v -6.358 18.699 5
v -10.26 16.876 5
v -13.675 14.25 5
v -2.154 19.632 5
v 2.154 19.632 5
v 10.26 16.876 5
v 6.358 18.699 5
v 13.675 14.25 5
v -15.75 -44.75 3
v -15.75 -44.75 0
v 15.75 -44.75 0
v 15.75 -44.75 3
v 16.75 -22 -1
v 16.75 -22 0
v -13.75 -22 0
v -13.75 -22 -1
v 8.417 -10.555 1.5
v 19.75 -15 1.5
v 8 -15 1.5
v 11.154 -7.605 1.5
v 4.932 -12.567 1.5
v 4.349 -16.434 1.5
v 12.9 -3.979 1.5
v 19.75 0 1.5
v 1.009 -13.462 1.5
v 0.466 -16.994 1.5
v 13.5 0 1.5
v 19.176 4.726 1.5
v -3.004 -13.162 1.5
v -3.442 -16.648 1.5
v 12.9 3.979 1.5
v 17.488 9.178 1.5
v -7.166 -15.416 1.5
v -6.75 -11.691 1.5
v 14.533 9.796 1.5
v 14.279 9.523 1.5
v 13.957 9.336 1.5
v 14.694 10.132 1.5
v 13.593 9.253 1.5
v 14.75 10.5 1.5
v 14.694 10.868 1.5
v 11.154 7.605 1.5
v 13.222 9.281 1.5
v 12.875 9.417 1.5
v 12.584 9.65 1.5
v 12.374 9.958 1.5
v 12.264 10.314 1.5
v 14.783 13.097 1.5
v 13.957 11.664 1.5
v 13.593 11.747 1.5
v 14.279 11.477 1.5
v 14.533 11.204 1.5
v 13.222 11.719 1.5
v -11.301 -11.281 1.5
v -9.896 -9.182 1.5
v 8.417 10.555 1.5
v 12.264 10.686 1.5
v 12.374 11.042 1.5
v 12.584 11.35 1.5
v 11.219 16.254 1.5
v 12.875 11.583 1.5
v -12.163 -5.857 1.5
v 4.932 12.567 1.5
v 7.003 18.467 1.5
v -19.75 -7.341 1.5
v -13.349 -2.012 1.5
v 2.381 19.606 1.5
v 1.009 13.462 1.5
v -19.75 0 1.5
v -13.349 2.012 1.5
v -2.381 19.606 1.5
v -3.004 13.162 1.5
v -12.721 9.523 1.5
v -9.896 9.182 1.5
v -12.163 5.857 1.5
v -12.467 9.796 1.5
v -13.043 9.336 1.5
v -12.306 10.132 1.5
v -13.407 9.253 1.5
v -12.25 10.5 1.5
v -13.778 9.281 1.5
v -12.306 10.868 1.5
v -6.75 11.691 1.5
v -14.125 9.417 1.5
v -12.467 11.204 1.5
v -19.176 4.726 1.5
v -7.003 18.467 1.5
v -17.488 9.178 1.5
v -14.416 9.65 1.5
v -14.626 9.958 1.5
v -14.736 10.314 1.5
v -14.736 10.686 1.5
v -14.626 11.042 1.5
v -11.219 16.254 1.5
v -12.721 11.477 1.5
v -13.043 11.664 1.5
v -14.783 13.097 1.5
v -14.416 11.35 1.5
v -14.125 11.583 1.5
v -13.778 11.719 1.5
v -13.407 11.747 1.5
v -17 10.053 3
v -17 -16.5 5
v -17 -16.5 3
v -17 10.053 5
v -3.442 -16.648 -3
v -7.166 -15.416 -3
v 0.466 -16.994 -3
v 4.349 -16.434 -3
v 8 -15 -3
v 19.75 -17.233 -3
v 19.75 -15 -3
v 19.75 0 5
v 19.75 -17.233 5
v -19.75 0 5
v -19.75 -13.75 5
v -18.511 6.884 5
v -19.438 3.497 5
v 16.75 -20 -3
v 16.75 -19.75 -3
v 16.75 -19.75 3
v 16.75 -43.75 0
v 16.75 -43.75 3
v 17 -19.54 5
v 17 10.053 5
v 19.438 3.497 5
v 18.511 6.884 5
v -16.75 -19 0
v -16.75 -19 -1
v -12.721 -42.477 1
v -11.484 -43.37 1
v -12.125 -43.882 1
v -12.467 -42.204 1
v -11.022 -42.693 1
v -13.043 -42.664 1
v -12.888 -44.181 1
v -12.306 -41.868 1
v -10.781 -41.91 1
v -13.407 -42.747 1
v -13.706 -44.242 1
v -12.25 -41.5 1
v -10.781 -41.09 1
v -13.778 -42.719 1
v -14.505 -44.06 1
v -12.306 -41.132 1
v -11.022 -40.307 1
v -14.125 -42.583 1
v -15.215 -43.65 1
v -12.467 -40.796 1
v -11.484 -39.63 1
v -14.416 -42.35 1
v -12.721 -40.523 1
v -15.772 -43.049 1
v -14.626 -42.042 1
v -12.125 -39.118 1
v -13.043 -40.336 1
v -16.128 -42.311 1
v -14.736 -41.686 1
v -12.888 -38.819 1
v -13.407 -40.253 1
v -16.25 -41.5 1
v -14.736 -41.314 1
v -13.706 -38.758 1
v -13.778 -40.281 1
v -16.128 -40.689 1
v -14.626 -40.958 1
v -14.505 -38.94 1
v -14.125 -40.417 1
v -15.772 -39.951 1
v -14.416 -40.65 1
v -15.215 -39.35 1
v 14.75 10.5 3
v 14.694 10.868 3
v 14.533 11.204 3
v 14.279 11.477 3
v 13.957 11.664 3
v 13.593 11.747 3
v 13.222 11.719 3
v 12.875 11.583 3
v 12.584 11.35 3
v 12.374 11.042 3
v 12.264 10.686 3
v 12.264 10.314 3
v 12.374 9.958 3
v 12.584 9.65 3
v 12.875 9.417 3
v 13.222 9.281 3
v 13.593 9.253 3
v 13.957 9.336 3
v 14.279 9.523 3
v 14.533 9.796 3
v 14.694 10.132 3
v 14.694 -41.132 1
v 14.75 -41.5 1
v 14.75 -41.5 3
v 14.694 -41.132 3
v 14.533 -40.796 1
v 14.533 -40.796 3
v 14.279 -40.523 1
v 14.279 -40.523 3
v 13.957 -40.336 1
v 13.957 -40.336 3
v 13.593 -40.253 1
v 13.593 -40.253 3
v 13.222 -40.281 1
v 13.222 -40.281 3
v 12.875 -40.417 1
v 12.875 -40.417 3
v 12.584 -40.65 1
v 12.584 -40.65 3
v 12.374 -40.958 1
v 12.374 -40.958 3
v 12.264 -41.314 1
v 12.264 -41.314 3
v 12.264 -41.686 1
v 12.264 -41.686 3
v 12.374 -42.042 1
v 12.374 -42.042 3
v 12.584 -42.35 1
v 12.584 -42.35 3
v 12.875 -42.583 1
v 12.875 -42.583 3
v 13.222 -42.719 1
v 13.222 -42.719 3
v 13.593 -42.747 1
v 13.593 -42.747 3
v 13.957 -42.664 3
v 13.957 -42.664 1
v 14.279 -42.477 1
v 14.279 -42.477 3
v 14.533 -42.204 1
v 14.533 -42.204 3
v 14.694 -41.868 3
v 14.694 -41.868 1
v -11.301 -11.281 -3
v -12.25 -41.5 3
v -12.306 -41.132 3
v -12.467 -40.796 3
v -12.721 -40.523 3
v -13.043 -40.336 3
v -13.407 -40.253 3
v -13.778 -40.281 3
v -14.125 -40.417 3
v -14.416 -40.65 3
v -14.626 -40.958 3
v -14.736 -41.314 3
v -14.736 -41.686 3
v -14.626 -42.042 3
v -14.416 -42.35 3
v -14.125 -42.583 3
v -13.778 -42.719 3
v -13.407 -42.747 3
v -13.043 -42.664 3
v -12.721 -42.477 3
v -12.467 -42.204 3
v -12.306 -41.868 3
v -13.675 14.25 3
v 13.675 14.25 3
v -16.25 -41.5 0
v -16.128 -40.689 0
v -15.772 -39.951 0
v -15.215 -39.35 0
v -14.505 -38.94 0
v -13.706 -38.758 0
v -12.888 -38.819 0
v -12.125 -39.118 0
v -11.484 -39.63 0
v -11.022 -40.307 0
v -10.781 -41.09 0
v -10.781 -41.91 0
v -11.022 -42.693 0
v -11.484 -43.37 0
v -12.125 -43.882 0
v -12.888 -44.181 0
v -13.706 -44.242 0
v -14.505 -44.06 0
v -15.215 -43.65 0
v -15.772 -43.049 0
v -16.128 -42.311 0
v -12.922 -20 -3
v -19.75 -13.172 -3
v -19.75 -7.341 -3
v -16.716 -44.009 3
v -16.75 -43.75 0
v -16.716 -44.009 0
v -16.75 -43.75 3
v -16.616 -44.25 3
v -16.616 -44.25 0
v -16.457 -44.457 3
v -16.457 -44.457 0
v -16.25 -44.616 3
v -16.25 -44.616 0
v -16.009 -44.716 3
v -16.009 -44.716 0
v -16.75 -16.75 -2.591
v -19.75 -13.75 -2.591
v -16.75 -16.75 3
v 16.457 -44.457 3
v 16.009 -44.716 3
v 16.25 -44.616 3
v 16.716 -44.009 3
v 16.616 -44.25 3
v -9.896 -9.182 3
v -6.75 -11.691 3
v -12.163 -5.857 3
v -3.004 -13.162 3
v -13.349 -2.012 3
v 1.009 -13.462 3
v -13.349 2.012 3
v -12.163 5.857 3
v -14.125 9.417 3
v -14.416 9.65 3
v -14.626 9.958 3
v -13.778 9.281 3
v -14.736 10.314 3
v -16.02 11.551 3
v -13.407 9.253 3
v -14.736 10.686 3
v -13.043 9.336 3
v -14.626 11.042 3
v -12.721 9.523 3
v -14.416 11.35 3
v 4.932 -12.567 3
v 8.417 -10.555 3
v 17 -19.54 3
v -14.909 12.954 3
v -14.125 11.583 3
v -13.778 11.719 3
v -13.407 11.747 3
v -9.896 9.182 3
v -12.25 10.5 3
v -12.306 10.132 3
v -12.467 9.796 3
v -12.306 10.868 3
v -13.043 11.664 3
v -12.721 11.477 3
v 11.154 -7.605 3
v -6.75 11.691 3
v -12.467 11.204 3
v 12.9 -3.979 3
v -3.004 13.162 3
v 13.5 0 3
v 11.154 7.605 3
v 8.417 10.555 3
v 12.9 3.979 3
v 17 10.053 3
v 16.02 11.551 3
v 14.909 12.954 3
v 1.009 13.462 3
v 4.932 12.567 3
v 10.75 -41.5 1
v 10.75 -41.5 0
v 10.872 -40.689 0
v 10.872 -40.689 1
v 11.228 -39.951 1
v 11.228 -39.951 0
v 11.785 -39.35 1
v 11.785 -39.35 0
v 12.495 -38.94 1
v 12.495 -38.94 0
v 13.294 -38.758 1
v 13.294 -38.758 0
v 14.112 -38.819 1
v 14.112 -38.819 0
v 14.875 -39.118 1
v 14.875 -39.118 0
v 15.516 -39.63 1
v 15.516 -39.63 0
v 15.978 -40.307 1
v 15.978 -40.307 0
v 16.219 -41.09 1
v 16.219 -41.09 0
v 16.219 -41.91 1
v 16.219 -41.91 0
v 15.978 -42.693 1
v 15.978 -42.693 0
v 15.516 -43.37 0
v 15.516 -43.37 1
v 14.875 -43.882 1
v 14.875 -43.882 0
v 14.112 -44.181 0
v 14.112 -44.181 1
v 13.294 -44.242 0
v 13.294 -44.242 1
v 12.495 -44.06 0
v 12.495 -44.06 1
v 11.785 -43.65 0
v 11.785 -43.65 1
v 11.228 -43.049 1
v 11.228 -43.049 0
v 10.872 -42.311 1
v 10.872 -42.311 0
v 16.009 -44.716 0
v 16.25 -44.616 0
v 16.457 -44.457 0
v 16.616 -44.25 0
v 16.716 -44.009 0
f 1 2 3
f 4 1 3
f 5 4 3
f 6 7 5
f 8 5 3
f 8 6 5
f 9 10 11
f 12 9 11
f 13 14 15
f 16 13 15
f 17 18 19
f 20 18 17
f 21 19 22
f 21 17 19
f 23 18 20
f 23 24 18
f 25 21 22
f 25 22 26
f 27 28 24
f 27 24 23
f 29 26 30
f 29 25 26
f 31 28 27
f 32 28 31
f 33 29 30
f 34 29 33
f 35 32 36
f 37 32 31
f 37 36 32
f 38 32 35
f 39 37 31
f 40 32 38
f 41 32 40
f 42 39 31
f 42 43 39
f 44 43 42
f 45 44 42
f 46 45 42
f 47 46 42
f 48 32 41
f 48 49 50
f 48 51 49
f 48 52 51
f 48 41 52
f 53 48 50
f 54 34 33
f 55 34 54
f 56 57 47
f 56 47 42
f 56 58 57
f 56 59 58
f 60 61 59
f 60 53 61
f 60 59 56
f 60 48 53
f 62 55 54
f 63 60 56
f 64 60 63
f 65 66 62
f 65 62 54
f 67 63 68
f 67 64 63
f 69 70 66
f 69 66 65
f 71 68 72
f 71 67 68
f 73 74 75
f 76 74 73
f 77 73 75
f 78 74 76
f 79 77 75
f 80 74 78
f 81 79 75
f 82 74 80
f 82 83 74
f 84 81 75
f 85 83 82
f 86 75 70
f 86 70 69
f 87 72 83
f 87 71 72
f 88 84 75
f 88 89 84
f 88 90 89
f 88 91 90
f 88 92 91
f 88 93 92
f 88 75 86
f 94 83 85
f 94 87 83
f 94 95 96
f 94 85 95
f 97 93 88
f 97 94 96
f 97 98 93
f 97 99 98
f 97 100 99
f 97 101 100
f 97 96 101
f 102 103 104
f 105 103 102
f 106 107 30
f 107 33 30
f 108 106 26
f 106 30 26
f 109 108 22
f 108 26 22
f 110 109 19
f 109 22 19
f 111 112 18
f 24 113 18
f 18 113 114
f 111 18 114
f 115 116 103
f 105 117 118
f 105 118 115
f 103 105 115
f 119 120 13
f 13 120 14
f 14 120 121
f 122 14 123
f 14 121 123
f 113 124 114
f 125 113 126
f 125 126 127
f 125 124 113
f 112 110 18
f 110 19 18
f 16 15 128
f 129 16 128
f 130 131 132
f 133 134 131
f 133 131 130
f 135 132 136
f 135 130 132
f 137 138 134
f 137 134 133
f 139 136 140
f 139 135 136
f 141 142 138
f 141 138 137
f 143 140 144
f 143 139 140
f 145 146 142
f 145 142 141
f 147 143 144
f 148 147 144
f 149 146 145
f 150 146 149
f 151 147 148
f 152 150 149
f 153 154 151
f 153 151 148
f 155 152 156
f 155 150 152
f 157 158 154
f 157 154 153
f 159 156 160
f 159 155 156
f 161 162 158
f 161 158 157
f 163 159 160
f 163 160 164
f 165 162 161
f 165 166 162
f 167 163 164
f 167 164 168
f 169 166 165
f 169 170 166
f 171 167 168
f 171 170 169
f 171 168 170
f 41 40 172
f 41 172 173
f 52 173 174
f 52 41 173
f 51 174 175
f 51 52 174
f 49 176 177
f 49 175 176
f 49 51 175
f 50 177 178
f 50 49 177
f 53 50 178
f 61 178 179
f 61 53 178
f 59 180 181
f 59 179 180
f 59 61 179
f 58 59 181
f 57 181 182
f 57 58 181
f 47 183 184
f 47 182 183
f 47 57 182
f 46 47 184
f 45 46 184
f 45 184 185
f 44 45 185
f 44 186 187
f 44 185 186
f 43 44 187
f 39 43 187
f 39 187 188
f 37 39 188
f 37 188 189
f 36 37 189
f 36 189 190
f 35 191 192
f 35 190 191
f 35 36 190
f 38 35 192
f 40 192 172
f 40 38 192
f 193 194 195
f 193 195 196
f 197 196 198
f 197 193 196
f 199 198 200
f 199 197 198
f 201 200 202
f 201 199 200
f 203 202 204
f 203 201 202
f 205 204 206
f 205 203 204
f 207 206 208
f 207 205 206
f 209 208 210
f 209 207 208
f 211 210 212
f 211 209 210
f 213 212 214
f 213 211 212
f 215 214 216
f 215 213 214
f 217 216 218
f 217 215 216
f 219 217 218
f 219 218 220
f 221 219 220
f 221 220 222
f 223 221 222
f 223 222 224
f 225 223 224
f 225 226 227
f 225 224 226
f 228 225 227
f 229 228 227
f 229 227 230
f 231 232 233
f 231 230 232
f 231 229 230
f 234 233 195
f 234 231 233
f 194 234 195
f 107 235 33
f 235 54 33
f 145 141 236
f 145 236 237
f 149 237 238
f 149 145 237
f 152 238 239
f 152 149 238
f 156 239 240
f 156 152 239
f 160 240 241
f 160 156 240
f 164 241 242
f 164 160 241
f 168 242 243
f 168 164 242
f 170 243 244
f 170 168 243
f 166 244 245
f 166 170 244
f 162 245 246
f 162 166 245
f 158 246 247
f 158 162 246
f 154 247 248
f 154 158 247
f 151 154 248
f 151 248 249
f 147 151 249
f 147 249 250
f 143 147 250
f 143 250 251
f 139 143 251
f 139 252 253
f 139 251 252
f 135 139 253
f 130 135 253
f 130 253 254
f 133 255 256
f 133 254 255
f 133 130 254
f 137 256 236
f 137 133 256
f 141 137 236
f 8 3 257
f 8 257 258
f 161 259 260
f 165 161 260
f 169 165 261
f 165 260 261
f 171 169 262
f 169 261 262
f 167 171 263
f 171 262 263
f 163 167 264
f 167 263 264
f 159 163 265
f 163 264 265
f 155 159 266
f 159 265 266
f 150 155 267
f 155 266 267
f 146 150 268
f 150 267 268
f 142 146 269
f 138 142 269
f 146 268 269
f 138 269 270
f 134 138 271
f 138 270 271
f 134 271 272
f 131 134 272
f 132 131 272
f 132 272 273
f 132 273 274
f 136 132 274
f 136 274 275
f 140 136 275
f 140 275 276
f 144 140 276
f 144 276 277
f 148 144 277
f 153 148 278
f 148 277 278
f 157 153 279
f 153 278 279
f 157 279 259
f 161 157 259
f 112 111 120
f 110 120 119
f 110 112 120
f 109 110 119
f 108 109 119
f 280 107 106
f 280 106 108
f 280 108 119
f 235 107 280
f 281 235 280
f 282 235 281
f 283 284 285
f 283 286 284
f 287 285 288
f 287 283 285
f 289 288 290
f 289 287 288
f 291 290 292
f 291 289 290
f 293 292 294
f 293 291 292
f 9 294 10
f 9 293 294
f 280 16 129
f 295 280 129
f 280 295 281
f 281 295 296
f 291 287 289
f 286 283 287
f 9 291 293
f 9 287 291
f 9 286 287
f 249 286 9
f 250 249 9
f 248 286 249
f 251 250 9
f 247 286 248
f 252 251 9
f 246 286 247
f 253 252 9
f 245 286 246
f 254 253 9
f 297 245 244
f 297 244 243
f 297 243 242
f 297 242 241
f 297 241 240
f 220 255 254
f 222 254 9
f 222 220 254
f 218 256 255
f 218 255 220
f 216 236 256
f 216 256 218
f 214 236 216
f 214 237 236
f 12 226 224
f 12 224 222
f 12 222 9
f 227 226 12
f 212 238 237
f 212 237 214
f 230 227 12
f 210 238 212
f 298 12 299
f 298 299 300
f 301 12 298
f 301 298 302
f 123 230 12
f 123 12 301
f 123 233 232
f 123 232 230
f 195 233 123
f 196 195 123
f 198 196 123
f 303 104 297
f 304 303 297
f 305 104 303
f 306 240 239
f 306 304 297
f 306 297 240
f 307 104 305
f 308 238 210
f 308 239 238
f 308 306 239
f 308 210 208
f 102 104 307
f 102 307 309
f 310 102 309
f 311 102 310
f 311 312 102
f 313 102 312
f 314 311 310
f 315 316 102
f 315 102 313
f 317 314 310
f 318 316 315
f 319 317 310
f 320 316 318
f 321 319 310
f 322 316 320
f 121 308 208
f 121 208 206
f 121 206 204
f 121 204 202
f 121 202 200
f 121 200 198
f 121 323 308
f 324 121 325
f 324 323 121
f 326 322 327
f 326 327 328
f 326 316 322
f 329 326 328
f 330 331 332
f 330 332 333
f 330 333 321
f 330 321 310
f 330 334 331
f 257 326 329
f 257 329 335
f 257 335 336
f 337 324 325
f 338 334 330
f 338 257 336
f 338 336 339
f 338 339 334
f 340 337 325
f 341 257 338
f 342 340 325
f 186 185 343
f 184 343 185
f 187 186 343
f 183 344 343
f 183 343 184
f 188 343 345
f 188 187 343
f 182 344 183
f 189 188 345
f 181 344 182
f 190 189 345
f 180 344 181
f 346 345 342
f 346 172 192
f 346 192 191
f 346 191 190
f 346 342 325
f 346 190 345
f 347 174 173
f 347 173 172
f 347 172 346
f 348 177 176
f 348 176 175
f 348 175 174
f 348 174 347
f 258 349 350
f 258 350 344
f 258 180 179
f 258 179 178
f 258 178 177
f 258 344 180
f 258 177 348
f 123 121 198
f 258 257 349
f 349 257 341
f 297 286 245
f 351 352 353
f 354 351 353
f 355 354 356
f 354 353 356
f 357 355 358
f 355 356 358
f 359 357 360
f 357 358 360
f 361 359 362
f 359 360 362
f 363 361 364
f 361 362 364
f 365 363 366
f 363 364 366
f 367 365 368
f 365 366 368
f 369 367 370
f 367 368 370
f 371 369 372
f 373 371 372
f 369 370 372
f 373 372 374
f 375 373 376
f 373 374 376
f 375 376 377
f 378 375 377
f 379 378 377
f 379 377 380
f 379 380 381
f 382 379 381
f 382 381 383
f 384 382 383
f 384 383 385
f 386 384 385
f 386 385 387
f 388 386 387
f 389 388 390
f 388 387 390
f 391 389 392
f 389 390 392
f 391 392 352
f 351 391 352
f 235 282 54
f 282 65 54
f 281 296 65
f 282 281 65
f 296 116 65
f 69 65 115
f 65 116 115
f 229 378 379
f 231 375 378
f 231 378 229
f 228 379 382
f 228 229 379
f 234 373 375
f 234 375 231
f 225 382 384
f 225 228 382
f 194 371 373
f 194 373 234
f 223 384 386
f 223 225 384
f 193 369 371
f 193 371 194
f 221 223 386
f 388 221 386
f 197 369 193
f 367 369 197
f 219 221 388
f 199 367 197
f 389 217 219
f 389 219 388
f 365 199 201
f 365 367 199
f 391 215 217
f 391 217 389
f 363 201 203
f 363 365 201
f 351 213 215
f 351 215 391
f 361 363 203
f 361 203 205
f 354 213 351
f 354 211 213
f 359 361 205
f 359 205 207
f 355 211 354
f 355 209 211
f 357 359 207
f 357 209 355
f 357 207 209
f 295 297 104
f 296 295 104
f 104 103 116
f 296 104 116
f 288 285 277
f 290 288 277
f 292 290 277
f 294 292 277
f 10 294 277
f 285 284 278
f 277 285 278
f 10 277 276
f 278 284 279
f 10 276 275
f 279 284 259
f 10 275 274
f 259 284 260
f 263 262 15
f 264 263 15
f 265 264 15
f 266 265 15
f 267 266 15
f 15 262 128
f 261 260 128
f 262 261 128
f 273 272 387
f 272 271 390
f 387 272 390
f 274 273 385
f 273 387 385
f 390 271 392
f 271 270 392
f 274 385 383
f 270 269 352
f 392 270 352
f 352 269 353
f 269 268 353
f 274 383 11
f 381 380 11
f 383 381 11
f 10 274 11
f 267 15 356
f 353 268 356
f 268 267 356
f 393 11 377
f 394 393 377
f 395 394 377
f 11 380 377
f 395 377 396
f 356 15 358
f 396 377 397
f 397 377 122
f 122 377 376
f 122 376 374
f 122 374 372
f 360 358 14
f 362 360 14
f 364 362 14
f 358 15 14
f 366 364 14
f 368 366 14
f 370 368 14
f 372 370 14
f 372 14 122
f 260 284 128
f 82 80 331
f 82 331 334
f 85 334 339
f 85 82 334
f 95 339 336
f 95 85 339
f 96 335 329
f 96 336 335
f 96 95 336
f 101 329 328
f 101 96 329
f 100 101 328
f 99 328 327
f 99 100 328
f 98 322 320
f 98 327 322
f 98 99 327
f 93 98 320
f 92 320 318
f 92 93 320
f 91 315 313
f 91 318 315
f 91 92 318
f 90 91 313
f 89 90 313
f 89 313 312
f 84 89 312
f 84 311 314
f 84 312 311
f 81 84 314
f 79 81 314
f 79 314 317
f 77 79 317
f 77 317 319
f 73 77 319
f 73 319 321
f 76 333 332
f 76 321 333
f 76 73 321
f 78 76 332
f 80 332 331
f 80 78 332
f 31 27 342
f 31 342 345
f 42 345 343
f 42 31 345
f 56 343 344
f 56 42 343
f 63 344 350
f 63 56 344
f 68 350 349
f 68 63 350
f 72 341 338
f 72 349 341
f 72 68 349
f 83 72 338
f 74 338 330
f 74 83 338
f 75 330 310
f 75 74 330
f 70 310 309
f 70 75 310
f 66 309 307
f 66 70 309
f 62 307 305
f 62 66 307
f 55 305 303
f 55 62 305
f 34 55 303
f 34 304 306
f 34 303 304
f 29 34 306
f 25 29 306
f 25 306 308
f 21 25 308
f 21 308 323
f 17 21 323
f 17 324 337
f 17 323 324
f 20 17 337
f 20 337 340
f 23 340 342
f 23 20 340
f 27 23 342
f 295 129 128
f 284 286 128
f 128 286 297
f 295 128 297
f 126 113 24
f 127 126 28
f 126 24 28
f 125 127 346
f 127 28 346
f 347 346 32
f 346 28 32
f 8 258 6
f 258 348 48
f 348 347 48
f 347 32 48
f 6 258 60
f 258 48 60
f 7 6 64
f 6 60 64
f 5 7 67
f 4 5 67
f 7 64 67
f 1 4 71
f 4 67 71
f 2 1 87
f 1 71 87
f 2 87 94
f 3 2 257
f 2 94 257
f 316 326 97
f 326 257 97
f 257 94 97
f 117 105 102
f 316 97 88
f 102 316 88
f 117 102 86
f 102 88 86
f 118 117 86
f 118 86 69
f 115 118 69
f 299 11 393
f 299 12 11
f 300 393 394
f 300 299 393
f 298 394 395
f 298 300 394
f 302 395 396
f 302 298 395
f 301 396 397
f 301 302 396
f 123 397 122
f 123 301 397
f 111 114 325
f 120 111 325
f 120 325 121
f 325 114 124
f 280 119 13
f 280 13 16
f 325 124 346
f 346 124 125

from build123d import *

# Parameters (mm, degrees)
SKETCH_1_R          = 1.25
SKETCH_1_R_2        = 13.5
EXTRUDE_1_DEPTH     = 5
SKETCH_2_R          = 2.75
CUT_EXTRUDE_1_DEPTH = 1
SKETCH_4_W          = 34
SKETCH_4_H          = 59
CUT_EXTRUDE_3_DEPTH = 2
EXTRUDE_2_DEPTH     = 3
CHAMFER_1_SIZE      = 2
CUT_EXTRUDE_4_DEPTH = 1.5
FILLET_3_R          = 1


with BuildPart() as part:
    # 草图1 → 凸台-拉伸1 (new body)
    with BuildSketch(Plane.XY):
        with BuildLine():
            Line((-16.75, -16.75), (-16.75, -44.75))
            Line((-16.75, -44.75), (16.75, -44.75))
            Line((16.75, -44.75), (16.75, -19.75))
            Line((16.75, -19.75), (19.75, -17.232701106))
            Line((19.75, -17.232701106), (19.75, 0))
            ThreePointArc((19.75, 0), (0, 19.75), (-19.75, 0))
            Line((-19.75, 0), (-19.75, -13.75))
            Line((-19.75, -13.75), (-16.75, -16.75))
        make_face()
        with Locations((-13.5, -41.5)):
            Circle(SKETCH_1_R, mode=Mode.SUBTRACT)
        with Locations((13.5, -41.5)):
            Circle(SKETCH_1_R, mode=Mode.SUBTRACT)
        Circle(SKETCH_1_R_2, mode=Mode.SUBTRACT)
        with Locations((-13.5, 10.5)):
            Circle(SKETCH_1_R, mode=Mode.SUBTRACT)
        with Locations((13.5, 10.5)):
            Circle(SKETCH_1_R, mode=Mode.SUBTRACT)
    extrude(amount=EXTRUDE_1_DEPTH)

    # 草图2 → 切除-拉伸1 (cut)
    with BuildSketch(Plane(origin=(0, 0, 0), x_dir=(-1, 0, 0), z_dir=(0, 0, -1))):
        with Locations((-13.5, -41.5)):
            Circle(SKETCH_2_R)
        with Locations((13.5, -41.5)):
            Circle(SKETCH_2_R)
    extrude(amount=-CUT_EXTRUDE_1_DEPTH, mode=Mode.SUBTRACT)

    # 草图4 → 切除-拉伸3 (cut)
    with BuildSketch(Plane.XY.offset(5)):
        with Locations((0, -15.25)):
            Rectangle(SKETCH_4_W, SKETCH_4_H)
    extrude(amount=-CUT_EXTRUDE_3_DEPTH, mode=Mode.SUBTRACT)

    # 草图5 → 凸台-拉伸2 (add)
    with BuildSketch(Plane(origin=(0, 0, 0), x_dir=(-1, 0, 0), z_dir=(0, 0, -1))):
        with BuildLine():
            Line((-16.75, -22), (13.75, -22))
            Line((13.75, -22), (16.75, -19))
            Line((16.75, -19), (16.75, -16.75))
            Line((16.75, -16.75), (19.75, -13.75))
            Line((19.75, -13.75), (19.75, -7.341092536))
            Line((19.75, -7.341092536), (11.300756088, -11.281039678))
            Line((11.300756088, -11.281039678), (7.165897883, -15.415897883))
            ThreePointArc((7.165897883, -15.415897883), (-0.466019686, -16.993611319), (-8, -15))
            Line((-8, -15), (-19.75, -15))
            Line((-19.75, -15), (-19.75, -17.232701106))
            Line((-19.75, -17.232701106), (-16.75, -19.75))
            Line((-16.75, -19.75), (-16.75, -22))
        make_face()
    extrude(amount=EXTRUDE_2_DEPTH)

    # 倒角1
    chamfer_1_edges = [part.edges().sort_by_distance(p)[0] for p in [
        (1.5, -22, -3),
        (-15.25, -20.5, -3),
    ]]
    chamfer(chamfer_1_edges, length=CHAMFER_1_SIZE)

    # 草图8 → 切除-拉伸4 (cut)
    with BuildSketch(Plane(origin=(0, 0, 0), x_dir=(-1, 0, 0), z_dir=(0, 0, -1))):
        with BuildLine():
            Line((-19.75, -15), (-8, -15))
            ThreePointArc((-8, -15), (-0.466019686, -16.993611319), (7.165897883, -15.415897883))
            Line((7.165897883, -15.415897883), (11.300756088, -11.281039678))
            Line((11.300756088, -11.281039678), (19.75, -7.341092536))
            Line((19.75, -7.341092536), (19.75, 0))
            ThreePointArc((19.75, 0), (0, 19.75), (-19.75, 0))
            Line((-19.75, 0), (-19.75, -15))
        make_face()
    extrude(amount=-CUT_EXTRUDE_4_DEPTH, mode=Mode.SUBTRACT)

    # 圆角3
    fillet_3_edges = [part.edges().sort_by_distance(p)[0] for p in [
        (16.75, -44.75, 1.5),
        (-16.75, -44.75, 1.5),
    ]]
    fillet(fillet_3_edges, radius=FILLET_3_R)


solid = part.part
